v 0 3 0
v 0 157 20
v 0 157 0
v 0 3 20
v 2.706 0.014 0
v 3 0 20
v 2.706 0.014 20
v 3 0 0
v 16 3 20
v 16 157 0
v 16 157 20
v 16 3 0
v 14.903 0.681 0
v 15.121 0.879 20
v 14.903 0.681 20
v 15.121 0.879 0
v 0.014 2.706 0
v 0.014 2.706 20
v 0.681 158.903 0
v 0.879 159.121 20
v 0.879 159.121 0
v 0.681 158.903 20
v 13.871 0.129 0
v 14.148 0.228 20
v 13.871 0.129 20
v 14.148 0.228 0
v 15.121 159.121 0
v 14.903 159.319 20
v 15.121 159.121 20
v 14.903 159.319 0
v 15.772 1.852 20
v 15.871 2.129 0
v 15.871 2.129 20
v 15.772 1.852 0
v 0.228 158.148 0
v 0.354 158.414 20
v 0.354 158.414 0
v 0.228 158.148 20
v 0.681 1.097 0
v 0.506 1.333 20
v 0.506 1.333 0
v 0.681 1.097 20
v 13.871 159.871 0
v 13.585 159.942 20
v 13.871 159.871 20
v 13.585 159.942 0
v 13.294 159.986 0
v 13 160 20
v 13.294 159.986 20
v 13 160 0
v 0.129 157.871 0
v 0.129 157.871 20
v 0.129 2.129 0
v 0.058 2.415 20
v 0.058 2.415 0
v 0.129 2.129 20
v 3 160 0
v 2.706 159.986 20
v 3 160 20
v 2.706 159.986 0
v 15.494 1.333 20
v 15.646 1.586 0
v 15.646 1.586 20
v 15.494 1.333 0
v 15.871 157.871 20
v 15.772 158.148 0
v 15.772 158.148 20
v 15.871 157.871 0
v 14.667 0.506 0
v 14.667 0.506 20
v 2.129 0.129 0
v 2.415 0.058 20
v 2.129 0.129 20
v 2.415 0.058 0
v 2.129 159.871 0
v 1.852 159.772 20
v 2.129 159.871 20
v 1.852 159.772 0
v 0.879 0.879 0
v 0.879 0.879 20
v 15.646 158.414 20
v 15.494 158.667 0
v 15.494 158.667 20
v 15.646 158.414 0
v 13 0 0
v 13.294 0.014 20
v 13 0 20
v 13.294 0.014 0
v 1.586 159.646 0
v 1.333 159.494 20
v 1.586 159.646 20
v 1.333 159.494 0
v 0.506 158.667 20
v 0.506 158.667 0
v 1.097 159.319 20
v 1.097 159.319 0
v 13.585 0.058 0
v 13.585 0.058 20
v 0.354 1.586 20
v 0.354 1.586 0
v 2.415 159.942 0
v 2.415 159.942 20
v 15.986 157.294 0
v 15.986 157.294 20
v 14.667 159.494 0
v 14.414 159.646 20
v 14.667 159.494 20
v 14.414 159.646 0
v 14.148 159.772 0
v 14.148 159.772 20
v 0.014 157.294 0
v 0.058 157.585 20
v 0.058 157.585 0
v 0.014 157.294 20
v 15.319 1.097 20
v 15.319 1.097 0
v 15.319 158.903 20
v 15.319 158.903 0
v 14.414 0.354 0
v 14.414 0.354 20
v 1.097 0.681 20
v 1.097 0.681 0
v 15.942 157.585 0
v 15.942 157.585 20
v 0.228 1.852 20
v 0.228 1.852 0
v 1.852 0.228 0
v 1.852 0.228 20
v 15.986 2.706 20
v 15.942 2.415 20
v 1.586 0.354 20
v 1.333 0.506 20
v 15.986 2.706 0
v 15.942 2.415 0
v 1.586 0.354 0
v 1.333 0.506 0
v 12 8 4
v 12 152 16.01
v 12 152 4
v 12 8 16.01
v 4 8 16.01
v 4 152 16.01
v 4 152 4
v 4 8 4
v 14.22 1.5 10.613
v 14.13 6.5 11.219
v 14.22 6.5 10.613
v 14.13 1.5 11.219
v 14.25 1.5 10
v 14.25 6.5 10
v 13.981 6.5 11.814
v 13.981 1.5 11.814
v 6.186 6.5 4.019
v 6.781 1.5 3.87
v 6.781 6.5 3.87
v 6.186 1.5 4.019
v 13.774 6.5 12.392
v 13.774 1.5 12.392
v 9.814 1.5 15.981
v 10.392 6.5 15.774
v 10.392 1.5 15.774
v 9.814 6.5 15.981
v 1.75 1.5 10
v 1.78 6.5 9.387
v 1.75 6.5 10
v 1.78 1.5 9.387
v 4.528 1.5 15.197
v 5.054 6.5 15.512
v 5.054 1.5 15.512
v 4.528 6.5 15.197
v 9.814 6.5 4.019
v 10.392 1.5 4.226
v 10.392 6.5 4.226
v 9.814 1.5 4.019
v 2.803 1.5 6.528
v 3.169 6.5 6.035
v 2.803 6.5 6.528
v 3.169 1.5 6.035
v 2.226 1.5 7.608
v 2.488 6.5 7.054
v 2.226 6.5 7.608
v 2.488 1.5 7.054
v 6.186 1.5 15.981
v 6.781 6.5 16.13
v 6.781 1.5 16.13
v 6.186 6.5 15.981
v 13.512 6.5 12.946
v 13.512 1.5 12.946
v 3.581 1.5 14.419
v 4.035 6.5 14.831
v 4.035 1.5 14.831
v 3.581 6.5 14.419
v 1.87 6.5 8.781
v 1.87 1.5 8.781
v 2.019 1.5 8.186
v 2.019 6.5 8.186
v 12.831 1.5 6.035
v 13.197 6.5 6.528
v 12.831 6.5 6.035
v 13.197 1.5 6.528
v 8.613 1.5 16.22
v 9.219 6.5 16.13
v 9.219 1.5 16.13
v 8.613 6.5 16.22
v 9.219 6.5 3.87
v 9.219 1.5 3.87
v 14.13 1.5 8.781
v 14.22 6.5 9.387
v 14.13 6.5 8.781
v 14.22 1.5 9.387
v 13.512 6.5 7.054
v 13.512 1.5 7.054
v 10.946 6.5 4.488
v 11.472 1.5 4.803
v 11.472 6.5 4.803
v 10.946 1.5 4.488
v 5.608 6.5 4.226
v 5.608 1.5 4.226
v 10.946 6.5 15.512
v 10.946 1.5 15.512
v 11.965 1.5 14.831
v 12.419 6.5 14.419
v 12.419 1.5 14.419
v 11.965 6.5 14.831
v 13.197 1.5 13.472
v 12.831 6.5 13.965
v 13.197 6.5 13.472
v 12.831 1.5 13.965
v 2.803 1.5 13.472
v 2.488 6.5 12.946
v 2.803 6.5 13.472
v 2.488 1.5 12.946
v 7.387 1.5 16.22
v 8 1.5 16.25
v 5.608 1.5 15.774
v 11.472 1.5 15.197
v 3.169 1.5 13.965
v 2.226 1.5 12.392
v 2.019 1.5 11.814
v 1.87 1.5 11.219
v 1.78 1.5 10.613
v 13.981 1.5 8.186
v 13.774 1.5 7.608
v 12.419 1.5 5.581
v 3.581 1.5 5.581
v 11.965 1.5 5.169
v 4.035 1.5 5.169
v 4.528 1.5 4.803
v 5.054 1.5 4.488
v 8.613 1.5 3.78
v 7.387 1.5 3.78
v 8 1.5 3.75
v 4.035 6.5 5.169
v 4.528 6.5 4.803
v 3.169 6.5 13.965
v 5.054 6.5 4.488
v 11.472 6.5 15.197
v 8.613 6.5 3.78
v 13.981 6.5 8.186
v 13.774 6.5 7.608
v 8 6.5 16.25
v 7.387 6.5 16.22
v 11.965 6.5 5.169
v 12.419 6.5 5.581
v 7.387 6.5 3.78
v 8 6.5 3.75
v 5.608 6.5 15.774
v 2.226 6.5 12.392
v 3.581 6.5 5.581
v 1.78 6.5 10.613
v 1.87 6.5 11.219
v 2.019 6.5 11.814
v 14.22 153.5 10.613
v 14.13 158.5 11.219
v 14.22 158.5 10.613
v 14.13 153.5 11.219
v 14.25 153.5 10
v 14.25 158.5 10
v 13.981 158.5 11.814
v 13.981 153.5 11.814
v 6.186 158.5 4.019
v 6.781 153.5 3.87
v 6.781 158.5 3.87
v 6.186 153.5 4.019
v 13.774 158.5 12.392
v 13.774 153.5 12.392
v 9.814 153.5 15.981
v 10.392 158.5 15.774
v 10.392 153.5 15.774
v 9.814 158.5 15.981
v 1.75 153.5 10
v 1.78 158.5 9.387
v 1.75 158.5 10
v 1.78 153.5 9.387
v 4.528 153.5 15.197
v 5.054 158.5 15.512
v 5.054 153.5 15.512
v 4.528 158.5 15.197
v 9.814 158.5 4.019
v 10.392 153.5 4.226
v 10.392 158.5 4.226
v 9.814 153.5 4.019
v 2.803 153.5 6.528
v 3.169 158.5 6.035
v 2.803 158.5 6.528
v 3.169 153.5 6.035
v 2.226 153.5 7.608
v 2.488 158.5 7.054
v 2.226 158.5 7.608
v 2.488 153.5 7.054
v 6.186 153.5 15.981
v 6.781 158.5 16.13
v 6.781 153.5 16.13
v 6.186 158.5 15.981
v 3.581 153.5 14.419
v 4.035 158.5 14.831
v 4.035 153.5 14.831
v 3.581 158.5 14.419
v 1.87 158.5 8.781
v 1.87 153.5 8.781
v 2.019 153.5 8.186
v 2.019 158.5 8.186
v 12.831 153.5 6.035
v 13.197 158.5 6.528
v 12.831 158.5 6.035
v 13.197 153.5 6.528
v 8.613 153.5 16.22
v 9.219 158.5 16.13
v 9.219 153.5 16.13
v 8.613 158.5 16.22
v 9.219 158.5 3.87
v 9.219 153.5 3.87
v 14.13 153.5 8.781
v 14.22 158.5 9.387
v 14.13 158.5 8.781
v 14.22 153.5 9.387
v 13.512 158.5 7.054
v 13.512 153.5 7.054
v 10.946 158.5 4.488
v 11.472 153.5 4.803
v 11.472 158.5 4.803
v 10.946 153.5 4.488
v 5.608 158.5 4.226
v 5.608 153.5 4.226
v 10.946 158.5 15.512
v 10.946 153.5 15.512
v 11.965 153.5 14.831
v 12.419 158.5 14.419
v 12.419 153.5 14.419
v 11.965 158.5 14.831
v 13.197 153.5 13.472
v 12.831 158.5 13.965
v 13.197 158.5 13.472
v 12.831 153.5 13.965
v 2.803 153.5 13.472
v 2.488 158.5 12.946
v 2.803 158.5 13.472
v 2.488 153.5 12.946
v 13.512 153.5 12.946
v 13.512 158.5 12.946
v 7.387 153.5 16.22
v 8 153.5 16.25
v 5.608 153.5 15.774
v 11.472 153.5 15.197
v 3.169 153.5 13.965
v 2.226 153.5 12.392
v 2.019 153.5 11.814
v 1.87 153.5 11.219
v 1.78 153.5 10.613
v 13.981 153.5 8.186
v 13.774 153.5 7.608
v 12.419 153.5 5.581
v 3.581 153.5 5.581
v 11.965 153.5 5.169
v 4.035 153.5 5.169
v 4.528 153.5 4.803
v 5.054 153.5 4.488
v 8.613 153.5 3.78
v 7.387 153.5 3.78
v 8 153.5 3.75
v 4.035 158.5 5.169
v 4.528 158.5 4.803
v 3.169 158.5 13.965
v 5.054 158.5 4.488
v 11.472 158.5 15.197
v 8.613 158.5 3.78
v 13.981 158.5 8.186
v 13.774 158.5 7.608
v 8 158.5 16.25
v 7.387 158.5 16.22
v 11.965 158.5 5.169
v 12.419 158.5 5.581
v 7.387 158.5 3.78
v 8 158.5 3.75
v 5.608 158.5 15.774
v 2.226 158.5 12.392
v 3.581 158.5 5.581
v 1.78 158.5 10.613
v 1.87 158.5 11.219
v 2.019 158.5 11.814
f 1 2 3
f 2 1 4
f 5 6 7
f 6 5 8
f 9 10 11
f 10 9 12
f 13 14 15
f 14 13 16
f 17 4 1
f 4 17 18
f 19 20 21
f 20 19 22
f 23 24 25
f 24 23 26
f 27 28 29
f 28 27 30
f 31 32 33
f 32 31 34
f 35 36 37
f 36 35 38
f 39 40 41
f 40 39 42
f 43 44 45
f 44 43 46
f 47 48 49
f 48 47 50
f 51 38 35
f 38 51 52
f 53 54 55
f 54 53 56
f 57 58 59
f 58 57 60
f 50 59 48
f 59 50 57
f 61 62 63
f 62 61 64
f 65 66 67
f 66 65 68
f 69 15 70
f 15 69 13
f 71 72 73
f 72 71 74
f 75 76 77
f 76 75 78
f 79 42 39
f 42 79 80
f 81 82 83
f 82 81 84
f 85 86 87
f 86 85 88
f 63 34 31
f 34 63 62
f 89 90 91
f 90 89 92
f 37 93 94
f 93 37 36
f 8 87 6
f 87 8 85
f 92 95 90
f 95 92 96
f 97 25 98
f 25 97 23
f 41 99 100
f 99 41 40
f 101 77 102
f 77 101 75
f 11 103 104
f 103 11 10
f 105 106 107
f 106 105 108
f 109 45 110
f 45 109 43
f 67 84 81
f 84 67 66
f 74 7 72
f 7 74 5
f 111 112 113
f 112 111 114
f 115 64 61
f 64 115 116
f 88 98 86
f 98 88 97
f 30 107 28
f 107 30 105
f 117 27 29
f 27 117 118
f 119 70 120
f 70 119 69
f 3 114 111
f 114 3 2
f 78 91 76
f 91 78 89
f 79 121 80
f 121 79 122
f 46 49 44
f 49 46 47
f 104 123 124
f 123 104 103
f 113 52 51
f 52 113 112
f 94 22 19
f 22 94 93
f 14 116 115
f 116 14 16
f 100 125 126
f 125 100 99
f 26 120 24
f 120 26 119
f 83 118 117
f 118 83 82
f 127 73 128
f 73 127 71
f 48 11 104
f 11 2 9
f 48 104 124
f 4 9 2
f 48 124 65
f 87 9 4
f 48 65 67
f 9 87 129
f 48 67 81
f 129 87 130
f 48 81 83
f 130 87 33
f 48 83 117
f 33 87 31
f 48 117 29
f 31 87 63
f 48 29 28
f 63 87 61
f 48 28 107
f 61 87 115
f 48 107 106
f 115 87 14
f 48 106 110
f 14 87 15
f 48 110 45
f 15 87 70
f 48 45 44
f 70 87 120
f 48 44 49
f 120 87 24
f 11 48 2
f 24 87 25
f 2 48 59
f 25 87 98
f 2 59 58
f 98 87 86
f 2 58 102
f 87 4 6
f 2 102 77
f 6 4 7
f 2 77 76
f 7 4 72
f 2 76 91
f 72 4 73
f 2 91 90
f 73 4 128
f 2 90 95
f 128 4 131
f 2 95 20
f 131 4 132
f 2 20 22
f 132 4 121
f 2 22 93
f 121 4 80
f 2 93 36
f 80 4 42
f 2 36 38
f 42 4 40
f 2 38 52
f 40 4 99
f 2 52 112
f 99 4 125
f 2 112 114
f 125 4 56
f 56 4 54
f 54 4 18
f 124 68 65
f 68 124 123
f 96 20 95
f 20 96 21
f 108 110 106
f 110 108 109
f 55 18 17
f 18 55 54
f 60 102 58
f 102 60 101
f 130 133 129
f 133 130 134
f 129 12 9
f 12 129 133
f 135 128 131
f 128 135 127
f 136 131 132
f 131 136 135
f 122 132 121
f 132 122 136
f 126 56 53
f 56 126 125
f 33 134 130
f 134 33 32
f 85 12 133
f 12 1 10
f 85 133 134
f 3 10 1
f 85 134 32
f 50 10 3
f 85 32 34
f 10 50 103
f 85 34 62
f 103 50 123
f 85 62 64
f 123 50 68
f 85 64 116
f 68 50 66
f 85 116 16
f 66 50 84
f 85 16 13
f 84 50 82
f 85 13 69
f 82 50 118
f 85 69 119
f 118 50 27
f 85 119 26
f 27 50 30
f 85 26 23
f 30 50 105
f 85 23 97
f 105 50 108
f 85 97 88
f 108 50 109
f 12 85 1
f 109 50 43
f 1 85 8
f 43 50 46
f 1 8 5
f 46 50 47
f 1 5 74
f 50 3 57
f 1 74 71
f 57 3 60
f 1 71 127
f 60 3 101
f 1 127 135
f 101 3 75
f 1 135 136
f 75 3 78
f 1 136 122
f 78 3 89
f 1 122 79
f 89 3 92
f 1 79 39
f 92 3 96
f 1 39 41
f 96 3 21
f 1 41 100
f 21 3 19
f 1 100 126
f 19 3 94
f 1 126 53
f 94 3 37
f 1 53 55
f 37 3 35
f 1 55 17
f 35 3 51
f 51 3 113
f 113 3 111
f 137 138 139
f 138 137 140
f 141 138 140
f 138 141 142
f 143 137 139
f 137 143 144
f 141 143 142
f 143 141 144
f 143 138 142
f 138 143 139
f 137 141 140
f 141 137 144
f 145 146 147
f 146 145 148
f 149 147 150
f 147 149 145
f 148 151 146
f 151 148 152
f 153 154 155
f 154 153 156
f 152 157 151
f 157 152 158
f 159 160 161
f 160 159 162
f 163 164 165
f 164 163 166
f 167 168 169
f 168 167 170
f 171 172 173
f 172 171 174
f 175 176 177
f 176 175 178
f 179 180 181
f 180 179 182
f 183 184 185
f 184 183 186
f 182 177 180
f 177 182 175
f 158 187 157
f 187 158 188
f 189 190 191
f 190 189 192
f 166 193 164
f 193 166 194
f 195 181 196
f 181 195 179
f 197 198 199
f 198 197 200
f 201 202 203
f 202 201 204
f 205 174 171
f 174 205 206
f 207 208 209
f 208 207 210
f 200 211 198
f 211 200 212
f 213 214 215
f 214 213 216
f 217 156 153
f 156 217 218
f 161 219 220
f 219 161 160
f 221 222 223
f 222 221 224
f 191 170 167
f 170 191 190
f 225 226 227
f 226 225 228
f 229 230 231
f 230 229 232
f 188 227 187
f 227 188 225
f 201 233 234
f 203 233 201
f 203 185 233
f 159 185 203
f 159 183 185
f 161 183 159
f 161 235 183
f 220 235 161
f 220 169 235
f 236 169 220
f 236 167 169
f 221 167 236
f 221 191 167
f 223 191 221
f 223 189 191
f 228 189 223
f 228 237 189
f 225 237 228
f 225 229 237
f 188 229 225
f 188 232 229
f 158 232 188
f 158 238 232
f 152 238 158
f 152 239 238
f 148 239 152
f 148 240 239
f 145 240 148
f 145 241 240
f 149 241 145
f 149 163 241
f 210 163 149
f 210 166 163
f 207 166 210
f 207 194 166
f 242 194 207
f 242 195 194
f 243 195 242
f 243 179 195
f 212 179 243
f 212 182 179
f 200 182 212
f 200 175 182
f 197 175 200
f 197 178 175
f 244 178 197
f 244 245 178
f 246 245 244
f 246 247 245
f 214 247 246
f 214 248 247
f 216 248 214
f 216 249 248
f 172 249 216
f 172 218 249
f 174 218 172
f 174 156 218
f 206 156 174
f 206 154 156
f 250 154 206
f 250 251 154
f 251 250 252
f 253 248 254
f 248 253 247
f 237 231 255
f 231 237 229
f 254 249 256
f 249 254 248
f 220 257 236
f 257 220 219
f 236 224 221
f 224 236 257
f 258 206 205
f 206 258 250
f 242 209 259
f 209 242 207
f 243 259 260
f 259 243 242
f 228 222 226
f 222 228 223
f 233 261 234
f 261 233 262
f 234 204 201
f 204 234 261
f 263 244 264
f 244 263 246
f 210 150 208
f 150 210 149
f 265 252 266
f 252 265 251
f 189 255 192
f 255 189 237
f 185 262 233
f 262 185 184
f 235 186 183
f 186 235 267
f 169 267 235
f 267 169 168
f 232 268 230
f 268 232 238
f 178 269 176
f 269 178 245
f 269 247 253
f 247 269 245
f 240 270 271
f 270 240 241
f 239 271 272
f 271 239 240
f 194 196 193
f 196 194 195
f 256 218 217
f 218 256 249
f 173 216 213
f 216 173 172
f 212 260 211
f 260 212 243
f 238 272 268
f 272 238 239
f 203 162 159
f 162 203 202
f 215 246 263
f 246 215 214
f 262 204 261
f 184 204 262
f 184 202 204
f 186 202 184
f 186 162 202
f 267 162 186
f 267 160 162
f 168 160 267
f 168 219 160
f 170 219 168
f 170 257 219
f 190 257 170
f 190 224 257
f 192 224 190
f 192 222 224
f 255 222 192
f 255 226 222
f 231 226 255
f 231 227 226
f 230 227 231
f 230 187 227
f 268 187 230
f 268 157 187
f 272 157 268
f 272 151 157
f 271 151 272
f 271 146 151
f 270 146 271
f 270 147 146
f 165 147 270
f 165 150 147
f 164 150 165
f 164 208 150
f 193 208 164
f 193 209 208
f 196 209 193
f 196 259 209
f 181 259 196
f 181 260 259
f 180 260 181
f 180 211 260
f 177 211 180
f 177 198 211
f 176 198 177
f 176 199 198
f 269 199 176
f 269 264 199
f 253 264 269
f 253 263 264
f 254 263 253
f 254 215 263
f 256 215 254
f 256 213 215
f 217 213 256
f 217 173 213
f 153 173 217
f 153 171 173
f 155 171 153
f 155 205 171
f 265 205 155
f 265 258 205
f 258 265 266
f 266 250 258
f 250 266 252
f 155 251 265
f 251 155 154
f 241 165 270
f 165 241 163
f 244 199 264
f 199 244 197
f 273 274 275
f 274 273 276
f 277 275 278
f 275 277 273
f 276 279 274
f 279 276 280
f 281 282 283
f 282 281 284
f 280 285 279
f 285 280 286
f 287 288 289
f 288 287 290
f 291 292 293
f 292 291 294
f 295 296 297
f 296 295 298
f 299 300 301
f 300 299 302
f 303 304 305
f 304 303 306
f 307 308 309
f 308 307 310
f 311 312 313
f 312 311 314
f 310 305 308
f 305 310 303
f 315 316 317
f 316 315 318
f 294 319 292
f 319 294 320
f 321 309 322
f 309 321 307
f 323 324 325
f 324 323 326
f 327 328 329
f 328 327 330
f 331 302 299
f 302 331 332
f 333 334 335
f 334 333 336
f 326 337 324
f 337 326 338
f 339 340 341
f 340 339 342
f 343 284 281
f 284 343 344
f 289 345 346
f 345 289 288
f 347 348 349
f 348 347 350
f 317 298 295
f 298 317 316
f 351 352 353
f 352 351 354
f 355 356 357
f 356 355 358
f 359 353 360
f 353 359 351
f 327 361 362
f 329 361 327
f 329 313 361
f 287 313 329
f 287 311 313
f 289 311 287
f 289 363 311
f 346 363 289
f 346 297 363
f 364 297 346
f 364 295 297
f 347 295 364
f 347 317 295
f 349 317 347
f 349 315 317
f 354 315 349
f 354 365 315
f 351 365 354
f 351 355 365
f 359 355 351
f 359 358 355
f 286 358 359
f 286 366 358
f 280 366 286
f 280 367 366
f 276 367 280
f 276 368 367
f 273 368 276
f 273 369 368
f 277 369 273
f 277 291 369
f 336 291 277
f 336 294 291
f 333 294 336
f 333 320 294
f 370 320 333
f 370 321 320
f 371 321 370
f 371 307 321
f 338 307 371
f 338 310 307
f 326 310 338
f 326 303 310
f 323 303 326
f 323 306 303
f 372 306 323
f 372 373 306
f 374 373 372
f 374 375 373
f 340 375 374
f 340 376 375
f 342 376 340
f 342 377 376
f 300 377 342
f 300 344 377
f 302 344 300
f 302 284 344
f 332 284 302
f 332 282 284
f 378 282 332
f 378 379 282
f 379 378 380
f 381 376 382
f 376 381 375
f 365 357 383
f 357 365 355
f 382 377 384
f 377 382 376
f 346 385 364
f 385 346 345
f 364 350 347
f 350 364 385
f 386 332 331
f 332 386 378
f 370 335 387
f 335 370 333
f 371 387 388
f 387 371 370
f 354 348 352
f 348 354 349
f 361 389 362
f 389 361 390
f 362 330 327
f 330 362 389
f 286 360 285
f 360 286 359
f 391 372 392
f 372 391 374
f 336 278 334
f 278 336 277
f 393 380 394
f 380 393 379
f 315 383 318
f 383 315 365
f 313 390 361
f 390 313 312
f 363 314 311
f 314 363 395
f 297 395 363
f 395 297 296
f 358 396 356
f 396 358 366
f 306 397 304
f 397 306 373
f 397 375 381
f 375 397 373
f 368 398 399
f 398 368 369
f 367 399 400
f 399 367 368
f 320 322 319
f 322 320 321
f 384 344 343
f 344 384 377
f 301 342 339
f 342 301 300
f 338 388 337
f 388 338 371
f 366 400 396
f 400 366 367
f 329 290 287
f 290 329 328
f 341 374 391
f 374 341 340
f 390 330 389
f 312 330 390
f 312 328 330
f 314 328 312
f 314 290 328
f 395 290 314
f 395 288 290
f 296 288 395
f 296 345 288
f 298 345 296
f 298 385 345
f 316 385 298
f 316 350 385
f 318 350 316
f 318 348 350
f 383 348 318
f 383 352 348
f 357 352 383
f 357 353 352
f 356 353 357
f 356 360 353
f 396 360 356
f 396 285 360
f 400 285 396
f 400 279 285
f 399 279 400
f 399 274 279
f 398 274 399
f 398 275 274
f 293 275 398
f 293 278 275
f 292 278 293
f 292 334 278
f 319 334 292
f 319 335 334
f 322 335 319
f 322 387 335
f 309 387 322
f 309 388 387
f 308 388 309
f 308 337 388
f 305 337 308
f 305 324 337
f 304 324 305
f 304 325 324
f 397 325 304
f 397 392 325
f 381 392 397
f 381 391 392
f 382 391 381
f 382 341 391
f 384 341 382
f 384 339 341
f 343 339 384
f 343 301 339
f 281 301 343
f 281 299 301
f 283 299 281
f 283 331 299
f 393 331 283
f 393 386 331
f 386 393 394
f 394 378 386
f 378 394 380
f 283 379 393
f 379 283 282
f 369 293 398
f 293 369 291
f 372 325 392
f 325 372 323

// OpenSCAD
// file: chopperchair_params.scad
// ChopperChair — Shared Parameters
// Injected by pipeline/bridge.py from measurements.json
// License: CC-BY-SA 4.0

// ── Dog measurements (mm) ─────────────────────────────────────────────────
torso_length     = 160;  // shoulder to hip
hip_width        = 90;   // widest point across hips
shoulder_width   = 80;   // front saddle width
rear_leg_length  = 80;   // floor to hip joint
ground_clearance = 45;   // chassis floor height
girth            = 165;  // belly circumference (harness ref)

// ── Hardware (mm) ─────────────────────────────────────────────────────────
wheel_diameter   = 100;  // purchased wheel OD
axle_diameter    = 8;    // purchased axle rod OD (Build 2: 8mm steel)
hub_motor_od     = 80;   // T-Motor MN1005 stator OD (Build 4 only)
hub_motor_depth  = 28;   // motor depth (Build 4 only)

// ── Frame geometry (mm) ───────────────────────────────────────────────────
wall_thickness   = 4;
rail_w           = 16;
rail_h           = 20;
crossbar_od      = 12;
spring_boss_od   = 18;
stopper_w        = 22;
stopper_h        = 15;

// ── SitGo pivot ───────────────────────────────────────────────────────────
collapse_angle   = 45;   // degrees — full lie-down
sit_angle        = 25;   // degrees — sit position
pivot_arm_t      = wall_thickness * 2.5;  // arm thickness

// ── Tolerances ────────────────────────────────────────────────────────────
clear_close      = 0.15; // press-fit clearance
clear_slide      = 0.25; // sliding fit clearance
clear_free       = 0.4;  // free-running clearance

$fn = 64;
// main file
// ChopperChair — Build 2: Hybrid
// 13 printed parts + ~$55 hardware (8mm steel axle, foam wheels, torsion springs, webbing)
// License: CC-BY-SA 4.0

include <chopperchair_params.scad>;

// ── Utilities ─────────────────────────────────────────────────────────────
module rounded_rect(w, h, d, r=3) {
    hull() {
        translate([ r, r, 0]) cylinder(r=r, h=d);
        translate([w-r, r, 0]) cylinder(r=r, h=d);
        translate([ r, h-r, 0]) cylinder(r=r, h=d);
        translate([w-r, h-r, 0]) cylinder(r=r, h=d);
    }
}

module chamfer_block(w, h, d, ch=1.5) {
    hull() {
        translate([ch, 0, 0]) cube([w-ch*2, h, d]);
        translate([0, ch, 0]) cube([w, h-ch*2, d]);
    }
}

// ── Rail (left — mirror for right) ────────────────────────────────────────
module rail() {
    difference() {
        rounded_rect(rail_w, torso_length, rail_h, r=3);
        // Lightening channel
        translate([wall_thickness, wall_thickness*2, wall_thickness])
            cube([rail_w - wall_thickness*2,
                  torso_length - wall_thickness*4,
                  rail_h - wall_thickness*2 + 0.01]);
        // Front crossbar socket
        translate([rail_w/2, wall_thickness, rail_h/2])
            rotate([90,0,0]) cylinder(d=crossbar_od + clear_slide*2, h=wall_thickness+1, center=true);
        // Rear crossbar socket
        translate([rail_w/2, torso_length - wall_thickness, rail_h/2])
            rotate([90,0,0]) cylinder(d=crossbar_od + clear_slide*2, h=wall_thickness+1, center=true);
    }
}

// ── Crossbar ──────────────────────────────────────────────────────────────
module crossbar(length) {
    cylinder(d=crossbar_od, h=length);
}

// ── Pivot arm (SitGo mechanism) ───────────────────────────────────────────
module pivot_arm() {
    arm_vert_w = rail_w;
    arm_tab_w  = rail_w * 2;
    arm_tab_h  = rail_h;
    axle_z     = wheel_diameter/2 + 5;

    difference() {
        union() {
            // Vertical section
            rounded_rect(arm_vert_w, rear_leg_length, pivot_arm_t, r=3);
            // Horizontal tab (spring boss platform)
            translate([arm_vert_w, rear_leg_length - arm_tab_h, 0])
                rounded_rect(arm_tab_w, arm_tab_h, pivot_arm_t, r=3);
            // Spring boss cylinder
            translate([arm_vert_w + arm_tab_w/2, rear_leg_length - arm_tab_h/2, pivot_arm_t])
                cylinder(d=spring_boss_od, h=8);
        }
        // Pivot bore (top — connects to rail)
        translate([arm_vert_w/2, rear_leg_length - arm_tab_h/2, -1])
            cylinder(d=axle_diameter + clear_close*2, h=pivot_arm_t+2);
        // Wheel axle bore (bottom)
        translate([arm_vert_w/2, axle_z, -1])
            cylinder(d=axle_diameter + clear_close*2, h=pivot_arm_t+2);
        // Spring boss locking bolt (M4)
        translate([arm_vert_w + arm_tab_w/2, rear_leg_length - arm_tab_h/2, -1])
            cylinder(d=4.5, h=spring_boss_od + 10);
        // Lightening holes in vertical section
        translate([arm_vert_w/2, rear_leg_length * 0.4, wall_thickness])
            cylinder(d=arm_vert_w*0.5, h=pivot_arm_t - wall_thickness*2 + 0.01);
    }
}

// ── Axle cap ──────────────────────────────────────────────────────────────
module axle_cap() {
    difference() {
        cylinder(d=axle_diameter + 8, h=14);
        // Press-fit bore
        translate([0,0,-0.01]) cylinder(d=axle_diameter - clear_close*2, h=10);
        // M4 set screw
        translate([axle_diameter/2 + 2, 0, 7]) rotate([0,90,0]) cylinder(d=3.3, h=8);
    }
}

// ── Spring boss (removable — press-fit into arm tab) ──────────────────────
module spring_boss() {
    difference() {
        cylinder(d=spring_boss_od - clear_close*2, h=12);
        translate([0,0,4]) cylinder(d=spring_boss_od*0.5, h=9);
        translate([0,0,-0.01]) cylinder(d=4.5, h=13);
    }
}

// ── Stopper (TPU — sits in arm slot to limit collapse angle) ──────────────
module stopper() {
    difference() {
        rounded_rect(stopper_w, stopper_h, pivot_arm_t, r=2);
        // Bolt slots
        translate([stopper_w*0.25, stopper_h/2, -1])
            cylinder(d=4.5, h=pivot_arm_t+2);
        translate([stopper_w*0.75, stopper_h/2, -1])
            cylinder(d=4.5, h=pivot_arm_t+2);
    }
}

// ── Belly sling mount ─────────────────────────────────────────────────────
module belly_sling_mount() {
    slot_w = 12; slot_h = 4; // 1" webbing slots
    difference() {
        rounded_rect(hip_width * 0.4, 30, 8, r=3);
        // Two webbing slots
        translate([8, 10, wall_thickness])
            cube([slot_w, slot_h, 8 - wall_thickness + 1]);
        translate([hip_width*0.4 - 8 - slot_w, 10, wall_thickness])
            cube([slot_w, slot_h, 8 - wall_thickness + 1]);
        // Mounting bolt holes
        translate([hip_width*0.4/2, 25, -1]) cylinder(d=4.5, h=10);
    }
}

// ── Assembly preview (comment out for individual STL export) ──────────────
// translate([0, 0, ground_clearance]) rail();
// translate([hip_width, 0, ground_clearance]) mirror([1,0,0]) rail();
// translate([0, 0, ground_clearance]) rotate([90,0,90]) crossbar(hip_width + rail_w*2);
// translate([0, 0, 0]) pivot_arm();
// translate([hip_width, 0, 0]) mirror([1,0,0]) pivot_arm();

// ── Individual part render (set part= when slicing) ───────────────────────
part = "rail_left"; // rail_left | rail_right | crossbar_front | crossbar_rear
                    // pivot_arm_left | pivot_arm_right | spring_boss_left | spring_boss_right
                    // axle_cap_left | axle_cap_right | stopper_left | stopper_right | belly_sling_mount

if (part == "rail_left")          rail();
if (part == "rail_right")         mirror([1,0,0]) rail();
if (part == "crossbar_front")     crossbar(hip_width + rail_w*2);
if (part == "crossbar_rear")      crossbar(hip_width + rail_w*2);
if (part == "pivot_arm_left")     pivot_arm();
if (part == "pivot_arm_right")    mirror([1,0,0]) pivot_arm();
if (part == "spring_boss_left")   spring_boss();
if (part == "spring_boss_right")  spring_boss();
if (part == "axle_cap_left")      axle_cap();
if (part == "axle_cap_right")     axle_cap();
if (part == "stopper_left")       stopper();
if (part == "stopper_right")      stopper();
if (part == "belly_sling_mount")  belly_sling_mount();
